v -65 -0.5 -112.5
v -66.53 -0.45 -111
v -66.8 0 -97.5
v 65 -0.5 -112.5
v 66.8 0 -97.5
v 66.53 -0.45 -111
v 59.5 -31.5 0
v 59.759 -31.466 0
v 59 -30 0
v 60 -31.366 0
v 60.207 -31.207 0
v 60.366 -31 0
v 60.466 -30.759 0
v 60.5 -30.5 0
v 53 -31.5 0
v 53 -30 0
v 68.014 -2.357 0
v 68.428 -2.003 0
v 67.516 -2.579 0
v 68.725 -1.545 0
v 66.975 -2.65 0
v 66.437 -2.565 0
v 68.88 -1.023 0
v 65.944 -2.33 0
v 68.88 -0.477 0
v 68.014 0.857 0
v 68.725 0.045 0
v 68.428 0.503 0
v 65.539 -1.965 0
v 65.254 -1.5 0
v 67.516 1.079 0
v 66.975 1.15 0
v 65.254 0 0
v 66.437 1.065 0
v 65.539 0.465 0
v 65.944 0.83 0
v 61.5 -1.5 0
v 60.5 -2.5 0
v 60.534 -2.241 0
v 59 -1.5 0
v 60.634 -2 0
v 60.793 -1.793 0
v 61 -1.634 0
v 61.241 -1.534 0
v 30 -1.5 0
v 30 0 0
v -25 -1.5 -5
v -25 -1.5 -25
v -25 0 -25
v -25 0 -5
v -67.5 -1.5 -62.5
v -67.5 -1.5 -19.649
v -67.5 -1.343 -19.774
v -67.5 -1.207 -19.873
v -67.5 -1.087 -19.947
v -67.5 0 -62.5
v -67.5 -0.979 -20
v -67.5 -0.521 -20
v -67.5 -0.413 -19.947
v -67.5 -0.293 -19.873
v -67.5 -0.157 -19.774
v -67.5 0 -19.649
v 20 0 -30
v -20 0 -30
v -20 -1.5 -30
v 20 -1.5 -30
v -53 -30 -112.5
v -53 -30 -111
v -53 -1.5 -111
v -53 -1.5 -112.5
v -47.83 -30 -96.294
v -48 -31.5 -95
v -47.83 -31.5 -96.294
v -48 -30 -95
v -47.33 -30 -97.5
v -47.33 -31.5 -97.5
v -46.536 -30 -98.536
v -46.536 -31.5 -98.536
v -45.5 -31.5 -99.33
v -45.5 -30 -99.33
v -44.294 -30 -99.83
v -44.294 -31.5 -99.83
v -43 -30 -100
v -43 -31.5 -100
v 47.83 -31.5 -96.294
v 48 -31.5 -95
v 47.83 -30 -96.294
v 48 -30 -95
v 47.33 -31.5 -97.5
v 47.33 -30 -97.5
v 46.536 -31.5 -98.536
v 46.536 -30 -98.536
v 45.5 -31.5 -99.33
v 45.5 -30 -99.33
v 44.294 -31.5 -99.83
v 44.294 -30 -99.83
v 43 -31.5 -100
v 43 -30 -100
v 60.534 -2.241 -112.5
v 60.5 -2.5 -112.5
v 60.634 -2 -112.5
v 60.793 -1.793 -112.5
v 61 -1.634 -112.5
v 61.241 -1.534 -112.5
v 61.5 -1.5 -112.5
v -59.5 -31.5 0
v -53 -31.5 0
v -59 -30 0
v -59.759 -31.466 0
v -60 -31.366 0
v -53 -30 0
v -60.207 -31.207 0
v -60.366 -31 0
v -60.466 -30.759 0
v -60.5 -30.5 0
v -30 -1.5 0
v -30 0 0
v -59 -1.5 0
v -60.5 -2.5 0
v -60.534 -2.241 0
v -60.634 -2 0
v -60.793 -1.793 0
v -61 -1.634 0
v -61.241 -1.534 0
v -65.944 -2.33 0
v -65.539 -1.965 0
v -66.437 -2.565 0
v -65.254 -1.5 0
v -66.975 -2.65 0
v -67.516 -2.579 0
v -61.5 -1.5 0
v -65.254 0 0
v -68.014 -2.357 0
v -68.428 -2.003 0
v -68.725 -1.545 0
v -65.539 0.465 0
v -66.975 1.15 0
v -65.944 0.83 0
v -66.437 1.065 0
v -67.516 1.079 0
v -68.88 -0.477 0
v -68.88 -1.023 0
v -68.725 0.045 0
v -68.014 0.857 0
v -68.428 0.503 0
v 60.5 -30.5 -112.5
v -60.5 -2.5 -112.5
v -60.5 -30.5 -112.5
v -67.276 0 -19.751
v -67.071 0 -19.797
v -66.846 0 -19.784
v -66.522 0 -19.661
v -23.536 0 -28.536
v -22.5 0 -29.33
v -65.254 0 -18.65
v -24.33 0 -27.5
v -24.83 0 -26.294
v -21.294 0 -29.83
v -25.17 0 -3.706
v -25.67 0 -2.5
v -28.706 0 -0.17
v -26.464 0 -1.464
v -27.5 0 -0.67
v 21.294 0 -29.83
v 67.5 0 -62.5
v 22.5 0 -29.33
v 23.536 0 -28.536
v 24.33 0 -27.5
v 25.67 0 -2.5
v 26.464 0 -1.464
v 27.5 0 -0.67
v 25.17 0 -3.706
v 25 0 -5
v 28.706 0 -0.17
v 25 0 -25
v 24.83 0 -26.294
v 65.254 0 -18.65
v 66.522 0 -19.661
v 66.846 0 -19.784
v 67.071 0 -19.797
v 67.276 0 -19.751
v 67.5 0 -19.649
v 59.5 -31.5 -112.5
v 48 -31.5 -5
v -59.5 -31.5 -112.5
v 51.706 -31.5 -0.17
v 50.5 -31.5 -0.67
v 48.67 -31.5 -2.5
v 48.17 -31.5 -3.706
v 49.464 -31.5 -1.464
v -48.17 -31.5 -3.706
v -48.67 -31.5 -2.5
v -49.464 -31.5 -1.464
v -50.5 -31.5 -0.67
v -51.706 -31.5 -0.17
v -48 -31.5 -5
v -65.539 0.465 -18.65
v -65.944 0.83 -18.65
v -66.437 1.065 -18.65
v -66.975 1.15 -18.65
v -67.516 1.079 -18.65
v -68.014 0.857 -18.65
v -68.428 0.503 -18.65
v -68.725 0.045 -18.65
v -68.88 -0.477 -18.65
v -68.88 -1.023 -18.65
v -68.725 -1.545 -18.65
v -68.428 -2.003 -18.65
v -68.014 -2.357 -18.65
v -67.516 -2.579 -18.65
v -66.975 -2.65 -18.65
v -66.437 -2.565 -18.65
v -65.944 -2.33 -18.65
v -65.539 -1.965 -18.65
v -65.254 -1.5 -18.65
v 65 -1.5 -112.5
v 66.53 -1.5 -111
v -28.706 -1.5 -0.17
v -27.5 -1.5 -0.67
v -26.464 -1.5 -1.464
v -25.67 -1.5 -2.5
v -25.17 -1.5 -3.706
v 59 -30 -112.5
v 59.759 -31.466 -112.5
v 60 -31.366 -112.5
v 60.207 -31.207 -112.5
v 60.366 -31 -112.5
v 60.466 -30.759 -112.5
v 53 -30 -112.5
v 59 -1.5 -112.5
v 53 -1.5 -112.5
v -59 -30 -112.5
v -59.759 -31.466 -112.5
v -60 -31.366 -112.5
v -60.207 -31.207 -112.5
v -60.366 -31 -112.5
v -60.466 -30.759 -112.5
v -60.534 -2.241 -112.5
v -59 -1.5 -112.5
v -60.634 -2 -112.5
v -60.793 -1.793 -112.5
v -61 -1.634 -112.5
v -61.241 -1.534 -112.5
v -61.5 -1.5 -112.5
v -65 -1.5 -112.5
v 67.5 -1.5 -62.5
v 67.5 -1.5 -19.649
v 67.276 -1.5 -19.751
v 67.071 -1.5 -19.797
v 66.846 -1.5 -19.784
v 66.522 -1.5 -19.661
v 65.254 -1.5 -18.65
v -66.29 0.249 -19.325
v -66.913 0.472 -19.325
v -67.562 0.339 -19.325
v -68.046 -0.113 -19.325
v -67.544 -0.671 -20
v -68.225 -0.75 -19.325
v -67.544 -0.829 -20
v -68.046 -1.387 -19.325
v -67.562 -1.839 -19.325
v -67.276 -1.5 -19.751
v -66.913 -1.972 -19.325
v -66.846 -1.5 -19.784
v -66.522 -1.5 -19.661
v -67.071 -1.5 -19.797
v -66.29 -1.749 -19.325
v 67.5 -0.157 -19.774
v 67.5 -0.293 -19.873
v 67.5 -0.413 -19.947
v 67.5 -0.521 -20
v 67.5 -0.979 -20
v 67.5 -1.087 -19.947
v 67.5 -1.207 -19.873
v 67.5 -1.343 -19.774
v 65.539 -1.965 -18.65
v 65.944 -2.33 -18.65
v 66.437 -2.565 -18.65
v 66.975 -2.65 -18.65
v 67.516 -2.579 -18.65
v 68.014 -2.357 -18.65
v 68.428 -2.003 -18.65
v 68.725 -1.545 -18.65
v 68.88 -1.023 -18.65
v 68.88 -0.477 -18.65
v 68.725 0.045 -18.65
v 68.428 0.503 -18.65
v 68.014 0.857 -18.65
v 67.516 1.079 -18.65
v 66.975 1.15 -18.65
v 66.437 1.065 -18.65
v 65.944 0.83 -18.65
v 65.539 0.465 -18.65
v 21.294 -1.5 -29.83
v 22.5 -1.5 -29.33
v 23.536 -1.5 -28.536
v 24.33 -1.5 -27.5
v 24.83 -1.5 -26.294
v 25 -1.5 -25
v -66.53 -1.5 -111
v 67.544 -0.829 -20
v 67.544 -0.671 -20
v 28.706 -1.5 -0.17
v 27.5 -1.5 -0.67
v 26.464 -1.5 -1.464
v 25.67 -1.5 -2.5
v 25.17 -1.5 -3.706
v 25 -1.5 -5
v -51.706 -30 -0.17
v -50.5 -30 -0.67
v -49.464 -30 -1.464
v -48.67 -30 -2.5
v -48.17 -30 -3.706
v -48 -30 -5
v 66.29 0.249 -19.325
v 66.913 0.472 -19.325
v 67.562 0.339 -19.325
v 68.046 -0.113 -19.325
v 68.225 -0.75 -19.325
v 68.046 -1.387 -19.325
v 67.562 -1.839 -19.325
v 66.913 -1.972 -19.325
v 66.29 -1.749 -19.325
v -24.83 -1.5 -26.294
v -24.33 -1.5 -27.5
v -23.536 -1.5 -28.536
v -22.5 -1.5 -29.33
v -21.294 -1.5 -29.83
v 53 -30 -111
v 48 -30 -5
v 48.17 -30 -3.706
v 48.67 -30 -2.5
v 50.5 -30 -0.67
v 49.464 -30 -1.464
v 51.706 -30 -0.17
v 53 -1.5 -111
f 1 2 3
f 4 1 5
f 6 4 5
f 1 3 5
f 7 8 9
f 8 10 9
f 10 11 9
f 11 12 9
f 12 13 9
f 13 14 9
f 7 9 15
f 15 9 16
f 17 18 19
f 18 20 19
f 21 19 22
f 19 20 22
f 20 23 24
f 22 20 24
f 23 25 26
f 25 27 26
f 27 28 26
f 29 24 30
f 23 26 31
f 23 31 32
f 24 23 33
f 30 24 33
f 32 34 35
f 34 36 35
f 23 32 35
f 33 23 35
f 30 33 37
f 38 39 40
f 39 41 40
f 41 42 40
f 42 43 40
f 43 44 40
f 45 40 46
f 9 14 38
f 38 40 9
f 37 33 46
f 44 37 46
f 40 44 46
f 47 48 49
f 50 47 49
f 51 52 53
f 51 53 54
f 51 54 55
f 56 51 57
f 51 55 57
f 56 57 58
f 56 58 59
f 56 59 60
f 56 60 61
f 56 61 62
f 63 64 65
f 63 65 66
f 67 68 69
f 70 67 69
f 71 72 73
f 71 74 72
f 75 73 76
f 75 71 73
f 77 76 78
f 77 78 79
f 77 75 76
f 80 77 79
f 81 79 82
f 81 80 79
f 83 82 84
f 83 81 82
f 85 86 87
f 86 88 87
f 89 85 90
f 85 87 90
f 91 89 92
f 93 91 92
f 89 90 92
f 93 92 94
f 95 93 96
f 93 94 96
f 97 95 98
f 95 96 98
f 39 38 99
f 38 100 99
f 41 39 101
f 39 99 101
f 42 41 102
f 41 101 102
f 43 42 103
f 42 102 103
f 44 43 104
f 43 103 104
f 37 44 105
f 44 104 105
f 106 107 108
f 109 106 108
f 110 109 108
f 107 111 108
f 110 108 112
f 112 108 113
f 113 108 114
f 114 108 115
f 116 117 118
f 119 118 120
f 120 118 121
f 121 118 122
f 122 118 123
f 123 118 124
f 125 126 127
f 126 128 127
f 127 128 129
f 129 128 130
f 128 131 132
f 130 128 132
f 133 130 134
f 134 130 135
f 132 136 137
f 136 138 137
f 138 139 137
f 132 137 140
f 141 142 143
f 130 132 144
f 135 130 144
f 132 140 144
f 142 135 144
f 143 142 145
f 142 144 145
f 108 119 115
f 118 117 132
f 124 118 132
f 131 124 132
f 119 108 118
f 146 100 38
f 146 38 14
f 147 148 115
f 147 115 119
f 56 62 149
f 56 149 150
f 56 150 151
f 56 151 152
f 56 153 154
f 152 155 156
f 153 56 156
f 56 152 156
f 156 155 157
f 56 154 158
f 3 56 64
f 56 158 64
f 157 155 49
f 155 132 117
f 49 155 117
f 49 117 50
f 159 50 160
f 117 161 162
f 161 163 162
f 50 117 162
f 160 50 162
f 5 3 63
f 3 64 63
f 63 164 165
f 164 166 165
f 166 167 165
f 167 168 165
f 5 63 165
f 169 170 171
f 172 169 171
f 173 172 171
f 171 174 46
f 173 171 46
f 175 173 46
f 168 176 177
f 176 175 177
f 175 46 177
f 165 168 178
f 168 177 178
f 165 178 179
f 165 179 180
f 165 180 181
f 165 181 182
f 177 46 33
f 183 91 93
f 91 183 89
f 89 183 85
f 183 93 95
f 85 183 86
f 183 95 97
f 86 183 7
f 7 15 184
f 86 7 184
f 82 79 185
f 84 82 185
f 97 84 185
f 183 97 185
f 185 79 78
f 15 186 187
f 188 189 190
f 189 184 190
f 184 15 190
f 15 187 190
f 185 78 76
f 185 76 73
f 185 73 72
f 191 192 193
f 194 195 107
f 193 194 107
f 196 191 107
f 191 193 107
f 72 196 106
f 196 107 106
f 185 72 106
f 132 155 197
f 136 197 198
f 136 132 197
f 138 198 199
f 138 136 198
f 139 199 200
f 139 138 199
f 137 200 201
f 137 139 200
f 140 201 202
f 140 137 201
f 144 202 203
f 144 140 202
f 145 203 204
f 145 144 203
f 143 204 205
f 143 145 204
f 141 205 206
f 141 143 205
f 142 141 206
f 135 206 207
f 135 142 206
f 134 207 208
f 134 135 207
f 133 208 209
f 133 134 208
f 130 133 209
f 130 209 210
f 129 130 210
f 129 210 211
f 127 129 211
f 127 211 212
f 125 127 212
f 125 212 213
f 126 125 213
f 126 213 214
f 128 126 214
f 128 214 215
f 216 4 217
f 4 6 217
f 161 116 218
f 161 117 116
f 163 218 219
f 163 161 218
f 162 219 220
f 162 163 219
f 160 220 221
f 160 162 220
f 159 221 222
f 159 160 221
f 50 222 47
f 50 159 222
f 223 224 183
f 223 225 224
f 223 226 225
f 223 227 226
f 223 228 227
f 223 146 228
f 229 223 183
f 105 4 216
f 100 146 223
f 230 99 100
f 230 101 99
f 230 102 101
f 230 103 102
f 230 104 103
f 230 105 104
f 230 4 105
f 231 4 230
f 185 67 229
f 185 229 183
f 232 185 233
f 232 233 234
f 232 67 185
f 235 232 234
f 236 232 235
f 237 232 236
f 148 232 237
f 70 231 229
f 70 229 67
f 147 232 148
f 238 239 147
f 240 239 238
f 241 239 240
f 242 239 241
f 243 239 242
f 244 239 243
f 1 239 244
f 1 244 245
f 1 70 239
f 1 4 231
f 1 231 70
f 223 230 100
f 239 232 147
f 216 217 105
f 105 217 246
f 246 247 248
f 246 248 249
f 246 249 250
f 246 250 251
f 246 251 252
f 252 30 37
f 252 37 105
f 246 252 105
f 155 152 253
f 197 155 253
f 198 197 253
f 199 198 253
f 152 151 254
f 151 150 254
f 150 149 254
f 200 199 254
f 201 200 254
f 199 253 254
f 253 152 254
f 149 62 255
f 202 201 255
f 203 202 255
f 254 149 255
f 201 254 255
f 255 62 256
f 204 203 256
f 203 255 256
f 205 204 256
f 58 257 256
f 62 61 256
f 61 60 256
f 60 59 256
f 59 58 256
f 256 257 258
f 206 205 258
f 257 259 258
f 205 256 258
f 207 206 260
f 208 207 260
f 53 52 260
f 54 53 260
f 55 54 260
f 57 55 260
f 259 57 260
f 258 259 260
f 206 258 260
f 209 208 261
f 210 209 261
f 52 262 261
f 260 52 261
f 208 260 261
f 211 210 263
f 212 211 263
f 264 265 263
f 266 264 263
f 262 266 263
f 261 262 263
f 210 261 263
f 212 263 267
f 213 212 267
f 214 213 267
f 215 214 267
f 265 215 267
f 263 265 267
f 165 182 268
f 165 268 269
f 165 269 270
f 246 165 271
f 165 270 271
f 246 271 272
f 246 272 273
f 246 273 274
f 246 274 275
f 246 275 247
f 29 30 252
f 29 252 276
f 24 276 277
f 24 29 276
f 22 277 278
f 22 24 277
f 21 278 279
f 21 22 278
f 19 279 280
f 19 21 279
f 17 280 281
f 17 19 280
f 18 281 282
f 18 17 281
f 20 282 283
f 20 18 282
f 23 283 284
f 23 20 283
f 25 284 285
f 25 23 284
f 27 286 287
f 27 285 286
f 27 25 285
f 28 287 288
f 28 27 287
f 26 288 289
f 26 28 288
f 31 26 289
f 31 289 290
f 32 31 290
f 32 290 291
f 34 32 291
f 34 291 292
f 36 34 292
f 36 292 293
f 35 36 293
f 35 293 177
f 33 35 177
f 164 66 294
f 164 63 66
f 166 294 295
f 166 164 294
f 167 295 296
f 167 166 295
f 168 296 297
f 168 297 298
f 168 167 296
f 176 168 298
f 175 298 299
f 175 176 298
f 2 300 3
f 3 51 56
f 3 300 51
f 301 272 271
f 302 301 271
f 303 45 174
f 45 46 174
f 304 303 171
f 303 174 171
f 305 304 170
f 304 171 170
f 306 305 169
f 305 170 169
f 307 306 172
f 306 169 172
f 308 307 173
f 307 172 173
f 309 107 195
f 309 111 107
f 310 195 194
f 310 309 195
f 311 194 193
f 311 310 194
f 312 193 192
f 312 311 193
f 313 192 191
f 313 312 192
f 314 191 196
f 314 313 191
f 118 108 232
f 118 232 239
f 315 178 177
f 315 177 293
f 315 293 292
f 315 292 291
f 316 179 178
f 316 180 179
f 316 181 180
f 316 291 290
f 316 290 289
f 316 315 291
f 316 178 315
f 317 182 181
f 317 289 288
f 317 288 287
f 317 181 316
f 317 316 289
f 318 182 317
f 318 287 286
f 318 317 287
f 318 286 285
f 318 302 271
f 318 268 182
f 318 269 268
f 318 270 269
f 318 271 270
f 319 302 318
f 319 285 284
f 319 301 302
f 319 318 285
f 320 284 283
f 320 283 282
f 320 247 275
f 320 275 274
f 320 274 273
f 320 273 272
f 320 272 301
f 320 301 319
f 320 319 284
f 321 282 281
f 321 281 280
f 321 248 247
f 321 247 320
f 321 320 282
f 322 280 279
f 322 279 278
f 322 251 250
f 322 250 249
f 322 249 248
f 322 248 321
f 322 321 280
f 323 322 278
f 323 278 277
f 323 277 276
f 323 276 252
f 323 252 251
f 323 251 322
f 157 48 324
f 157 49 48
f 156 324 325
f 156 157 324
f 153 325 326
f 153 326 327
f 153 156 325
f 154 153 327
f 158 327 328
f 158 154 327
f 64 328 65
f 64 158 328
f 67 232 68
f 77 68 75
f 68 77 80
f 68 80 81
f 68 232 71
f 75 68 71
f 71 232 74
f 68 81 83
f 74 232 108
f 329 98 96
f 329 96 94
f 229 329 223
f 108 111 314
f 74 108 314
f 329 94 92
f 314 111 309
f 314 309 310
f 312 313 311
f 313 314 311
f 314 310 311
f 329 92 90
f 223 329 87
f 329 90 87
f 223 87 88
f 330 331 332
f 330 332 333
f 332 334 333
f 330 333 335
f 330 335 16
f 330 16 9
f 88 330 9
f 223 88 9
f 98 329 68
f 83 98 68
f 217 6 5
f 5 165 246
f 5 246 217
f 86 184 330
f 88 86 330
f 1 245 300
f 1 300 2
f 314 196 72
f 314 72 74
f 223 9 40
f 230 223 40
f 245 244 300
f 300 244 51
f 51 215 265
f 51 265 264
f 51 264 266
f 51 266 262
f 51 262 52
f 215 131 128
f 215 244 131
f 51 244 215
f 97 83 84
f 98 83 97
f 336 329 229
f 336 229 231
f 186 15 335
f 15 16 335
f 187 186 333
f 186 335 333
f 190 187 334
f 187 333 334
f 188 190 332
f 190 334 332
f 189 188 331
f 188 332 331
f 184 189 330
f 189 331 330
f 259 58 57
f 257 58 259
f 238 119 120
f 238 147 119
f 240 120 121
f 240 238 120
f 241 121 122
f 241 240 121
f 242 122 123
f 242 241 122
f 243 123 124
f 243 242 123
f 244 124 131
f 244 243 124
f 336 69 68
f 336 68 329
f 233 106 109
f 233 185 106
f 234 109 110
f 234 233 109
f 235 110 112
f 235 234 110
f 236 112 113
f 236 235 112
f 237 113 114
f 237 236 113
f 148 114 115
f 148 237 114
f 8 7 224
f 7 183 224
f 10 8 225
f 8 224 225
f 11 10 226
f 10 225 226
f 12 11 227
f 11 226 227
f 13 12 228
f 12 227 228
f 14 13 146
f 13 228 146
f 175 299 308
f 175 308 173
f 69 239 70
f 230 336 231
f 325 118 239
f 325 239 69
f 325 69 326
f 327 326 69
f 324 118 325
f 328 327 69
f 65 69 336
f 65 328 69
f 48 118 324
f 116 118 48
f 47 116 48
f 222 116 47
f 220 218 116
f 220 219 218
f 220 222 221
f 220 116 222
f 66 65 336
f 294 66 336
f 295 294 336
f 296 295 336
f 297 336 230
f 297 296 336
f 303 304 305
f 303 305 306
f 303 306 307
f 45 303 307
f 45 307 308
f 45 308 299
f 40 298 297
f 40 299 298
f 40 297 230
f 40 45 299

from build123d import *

# Parameters (mm, degrees)
PAD_DEPTH        = 112.5
SKETCH002_W      = 118
SKETCH002_H      = 28.5
POCKET_DEPTH     = 111
SKETCH003_W      = 96
SKETCH003_H      = 30
POCKET001_DEPTH  = 100
SKETCH004_R      = 1.9
PAD001_DEPTH     = 20
SKETCH005_W      = 50
SKETCH005_H      = 50
POCKET002_DEPTH  = 30
FILLET_R         = 5
FILLET001_R      = 1
CHAMFER_SIZE2    = 50
CHAMFER_SIZE     = 1
CHAMFER001_SIZE  = 1.5
CHAMFER002_SIZE  = 1.35
CHAMFER003_SIZE2 = 15
CHAMFER003_SIZE  = 0.5
SKETCH006_W      = 6
SKETCH006_H      = 28.5
POCKET003_DEPTH  = 5


with BuildPart() as part:
    # Sketch → Pad (new body)
    with BuildSketch(Plane.XY):
        Polygon((-67.5, 0), (67.5, 0), (67.5, -1.5), (60.5, -1.5), (60.5, -31.5), (-60.5, -31.5), (-60.5, -1.5), (-67.5, -1.5), align=None)
    extrude(amount=-PAD_DEPTH)

    # Sketch002 → Pocket (cut)
    with BuildSketch(Plane.XY):
        with Locations((0, -15.75)):
            Rectangle(SKETCH002_W, SKETCH002_H)
    extrude(amount=-POCKET_DEPTH, mode=Mode.SUBTRACT)

    # Sketch003 → Pocket001 (cut)
    with BuildSketch(Plane.XY):
        with Locations((0, -25)):
            Rectangle(SKETCH003_W, SKETCH003_H)
    extrude(amount=-POCKET001_DEPTH, mode=Mode.SUBTRACT)

    # Sketch004 → Pad001 (join)
    with BuildSketch(Plane.XY):
        with Locations((-67, -0.75)):
            Circle(SKETCH004_R)
        with Locations((67, -0.75)):
            Circle(SKETCH004_R)
    extrude(amount=-PAD001_DEPTH)

    # Sketch005 → Pocket002 (cut)
    with BuildSketch(Plane.XY):
        Rectangle(SKETCH005_W, SKETCH005_H)
    extrude(amount=-POCKET002_DEPTH, mode=Mode.SUBTRACT)

    # Fillet
    fillet_edges = [part.edges().sort_by_distance(p)[0] for p in [
        (-25, -0.75, 0),
        (25, -0.75, 0),
        (25, -0.75, -30),
        (-25, -0.75, -30),
        (-48, -30.75, 0),
        (48, -30.75, 0),
        (48, -30.75, -100),
        (-48, -30.75, -100),
    ]]
    fillet(fillet_edges, radius=FILLET_R)

    # Fillet001
    fillet001_edges = [part.edges().sort_by_distance(p)[0] for p in [
        (-60.5, -1.5, -56.25),
        (-60.5, -31.5, -56.25),
        (60.5, -31.5, -56.25),
        (60.5, -1.5, -56.25),
    ]]
    fillet(fillet001_edges, radius=FILLET001_R)

    # Chamfer
    chamfer_edges = [part.edges().sort_by_distance(p)[0] for p in [
        (67.5, -0.75, -112.5),
        (-67.5, -0.75, -112.5),
    ]]
    chamfer_side = part.faces().sort_by_distance((0, -15.664499, -112.5))[0]
    chamfer(chamfer_edges, length=CHAMFER_SIZE, length2=CHAMFER_SIZE2, reference=chamfer_side)

    # Chamfer001
    chamfer001_edges = [part.edges().sort_by_distance(p)[0] for p in [
        (-66.5, -0.75, -112.5),
        (66.5, -0.75, -112.5),
    ]]
    chamfer(chamfer001_edges, length=CHAMFER001_SIZE)

    # Chamfer002
    chamfer002_edges = [part.edges().sort_by_distance(p)[0] for p in [
        (-68.9, -0.75, -20),
        (67.382853, 1.111028, -20),
    ]]
    chamfer(chamfer002_edges, length=CHAMFER002_SIZE)

    # Chamfer003
    chamfer003_edges = [part.edges().sort_by_distance(p)[0] for p in [
        (0, 0, -112.5),
    ]]
    chamfer003_side = part.faces().sort_by_distance((0, -15.693743, -112.5))[0]
    chamfer(chamfer003_edges, length=CHAMFER003_SIZE, length2=CHAMFER003_SIZE2, reference=chamfer003_side)

    # Sketch006 (on Face46 of Chamfer003) → Pocket003 (cut)
    with BuildSketch(Plane.XY.offset(-111)):
        with Locations((56, -15.75)):
            Rectangle(SKETCH006_W, SKETCH006_H)
        with Locations((-56, -15.75)):
            Rectangle(SKETCH006_W, SKETCH006_H)
    extrude(amount=-POCKET003_DEPTH, mode=Mode.SUBTRACT)


solid = part.part
